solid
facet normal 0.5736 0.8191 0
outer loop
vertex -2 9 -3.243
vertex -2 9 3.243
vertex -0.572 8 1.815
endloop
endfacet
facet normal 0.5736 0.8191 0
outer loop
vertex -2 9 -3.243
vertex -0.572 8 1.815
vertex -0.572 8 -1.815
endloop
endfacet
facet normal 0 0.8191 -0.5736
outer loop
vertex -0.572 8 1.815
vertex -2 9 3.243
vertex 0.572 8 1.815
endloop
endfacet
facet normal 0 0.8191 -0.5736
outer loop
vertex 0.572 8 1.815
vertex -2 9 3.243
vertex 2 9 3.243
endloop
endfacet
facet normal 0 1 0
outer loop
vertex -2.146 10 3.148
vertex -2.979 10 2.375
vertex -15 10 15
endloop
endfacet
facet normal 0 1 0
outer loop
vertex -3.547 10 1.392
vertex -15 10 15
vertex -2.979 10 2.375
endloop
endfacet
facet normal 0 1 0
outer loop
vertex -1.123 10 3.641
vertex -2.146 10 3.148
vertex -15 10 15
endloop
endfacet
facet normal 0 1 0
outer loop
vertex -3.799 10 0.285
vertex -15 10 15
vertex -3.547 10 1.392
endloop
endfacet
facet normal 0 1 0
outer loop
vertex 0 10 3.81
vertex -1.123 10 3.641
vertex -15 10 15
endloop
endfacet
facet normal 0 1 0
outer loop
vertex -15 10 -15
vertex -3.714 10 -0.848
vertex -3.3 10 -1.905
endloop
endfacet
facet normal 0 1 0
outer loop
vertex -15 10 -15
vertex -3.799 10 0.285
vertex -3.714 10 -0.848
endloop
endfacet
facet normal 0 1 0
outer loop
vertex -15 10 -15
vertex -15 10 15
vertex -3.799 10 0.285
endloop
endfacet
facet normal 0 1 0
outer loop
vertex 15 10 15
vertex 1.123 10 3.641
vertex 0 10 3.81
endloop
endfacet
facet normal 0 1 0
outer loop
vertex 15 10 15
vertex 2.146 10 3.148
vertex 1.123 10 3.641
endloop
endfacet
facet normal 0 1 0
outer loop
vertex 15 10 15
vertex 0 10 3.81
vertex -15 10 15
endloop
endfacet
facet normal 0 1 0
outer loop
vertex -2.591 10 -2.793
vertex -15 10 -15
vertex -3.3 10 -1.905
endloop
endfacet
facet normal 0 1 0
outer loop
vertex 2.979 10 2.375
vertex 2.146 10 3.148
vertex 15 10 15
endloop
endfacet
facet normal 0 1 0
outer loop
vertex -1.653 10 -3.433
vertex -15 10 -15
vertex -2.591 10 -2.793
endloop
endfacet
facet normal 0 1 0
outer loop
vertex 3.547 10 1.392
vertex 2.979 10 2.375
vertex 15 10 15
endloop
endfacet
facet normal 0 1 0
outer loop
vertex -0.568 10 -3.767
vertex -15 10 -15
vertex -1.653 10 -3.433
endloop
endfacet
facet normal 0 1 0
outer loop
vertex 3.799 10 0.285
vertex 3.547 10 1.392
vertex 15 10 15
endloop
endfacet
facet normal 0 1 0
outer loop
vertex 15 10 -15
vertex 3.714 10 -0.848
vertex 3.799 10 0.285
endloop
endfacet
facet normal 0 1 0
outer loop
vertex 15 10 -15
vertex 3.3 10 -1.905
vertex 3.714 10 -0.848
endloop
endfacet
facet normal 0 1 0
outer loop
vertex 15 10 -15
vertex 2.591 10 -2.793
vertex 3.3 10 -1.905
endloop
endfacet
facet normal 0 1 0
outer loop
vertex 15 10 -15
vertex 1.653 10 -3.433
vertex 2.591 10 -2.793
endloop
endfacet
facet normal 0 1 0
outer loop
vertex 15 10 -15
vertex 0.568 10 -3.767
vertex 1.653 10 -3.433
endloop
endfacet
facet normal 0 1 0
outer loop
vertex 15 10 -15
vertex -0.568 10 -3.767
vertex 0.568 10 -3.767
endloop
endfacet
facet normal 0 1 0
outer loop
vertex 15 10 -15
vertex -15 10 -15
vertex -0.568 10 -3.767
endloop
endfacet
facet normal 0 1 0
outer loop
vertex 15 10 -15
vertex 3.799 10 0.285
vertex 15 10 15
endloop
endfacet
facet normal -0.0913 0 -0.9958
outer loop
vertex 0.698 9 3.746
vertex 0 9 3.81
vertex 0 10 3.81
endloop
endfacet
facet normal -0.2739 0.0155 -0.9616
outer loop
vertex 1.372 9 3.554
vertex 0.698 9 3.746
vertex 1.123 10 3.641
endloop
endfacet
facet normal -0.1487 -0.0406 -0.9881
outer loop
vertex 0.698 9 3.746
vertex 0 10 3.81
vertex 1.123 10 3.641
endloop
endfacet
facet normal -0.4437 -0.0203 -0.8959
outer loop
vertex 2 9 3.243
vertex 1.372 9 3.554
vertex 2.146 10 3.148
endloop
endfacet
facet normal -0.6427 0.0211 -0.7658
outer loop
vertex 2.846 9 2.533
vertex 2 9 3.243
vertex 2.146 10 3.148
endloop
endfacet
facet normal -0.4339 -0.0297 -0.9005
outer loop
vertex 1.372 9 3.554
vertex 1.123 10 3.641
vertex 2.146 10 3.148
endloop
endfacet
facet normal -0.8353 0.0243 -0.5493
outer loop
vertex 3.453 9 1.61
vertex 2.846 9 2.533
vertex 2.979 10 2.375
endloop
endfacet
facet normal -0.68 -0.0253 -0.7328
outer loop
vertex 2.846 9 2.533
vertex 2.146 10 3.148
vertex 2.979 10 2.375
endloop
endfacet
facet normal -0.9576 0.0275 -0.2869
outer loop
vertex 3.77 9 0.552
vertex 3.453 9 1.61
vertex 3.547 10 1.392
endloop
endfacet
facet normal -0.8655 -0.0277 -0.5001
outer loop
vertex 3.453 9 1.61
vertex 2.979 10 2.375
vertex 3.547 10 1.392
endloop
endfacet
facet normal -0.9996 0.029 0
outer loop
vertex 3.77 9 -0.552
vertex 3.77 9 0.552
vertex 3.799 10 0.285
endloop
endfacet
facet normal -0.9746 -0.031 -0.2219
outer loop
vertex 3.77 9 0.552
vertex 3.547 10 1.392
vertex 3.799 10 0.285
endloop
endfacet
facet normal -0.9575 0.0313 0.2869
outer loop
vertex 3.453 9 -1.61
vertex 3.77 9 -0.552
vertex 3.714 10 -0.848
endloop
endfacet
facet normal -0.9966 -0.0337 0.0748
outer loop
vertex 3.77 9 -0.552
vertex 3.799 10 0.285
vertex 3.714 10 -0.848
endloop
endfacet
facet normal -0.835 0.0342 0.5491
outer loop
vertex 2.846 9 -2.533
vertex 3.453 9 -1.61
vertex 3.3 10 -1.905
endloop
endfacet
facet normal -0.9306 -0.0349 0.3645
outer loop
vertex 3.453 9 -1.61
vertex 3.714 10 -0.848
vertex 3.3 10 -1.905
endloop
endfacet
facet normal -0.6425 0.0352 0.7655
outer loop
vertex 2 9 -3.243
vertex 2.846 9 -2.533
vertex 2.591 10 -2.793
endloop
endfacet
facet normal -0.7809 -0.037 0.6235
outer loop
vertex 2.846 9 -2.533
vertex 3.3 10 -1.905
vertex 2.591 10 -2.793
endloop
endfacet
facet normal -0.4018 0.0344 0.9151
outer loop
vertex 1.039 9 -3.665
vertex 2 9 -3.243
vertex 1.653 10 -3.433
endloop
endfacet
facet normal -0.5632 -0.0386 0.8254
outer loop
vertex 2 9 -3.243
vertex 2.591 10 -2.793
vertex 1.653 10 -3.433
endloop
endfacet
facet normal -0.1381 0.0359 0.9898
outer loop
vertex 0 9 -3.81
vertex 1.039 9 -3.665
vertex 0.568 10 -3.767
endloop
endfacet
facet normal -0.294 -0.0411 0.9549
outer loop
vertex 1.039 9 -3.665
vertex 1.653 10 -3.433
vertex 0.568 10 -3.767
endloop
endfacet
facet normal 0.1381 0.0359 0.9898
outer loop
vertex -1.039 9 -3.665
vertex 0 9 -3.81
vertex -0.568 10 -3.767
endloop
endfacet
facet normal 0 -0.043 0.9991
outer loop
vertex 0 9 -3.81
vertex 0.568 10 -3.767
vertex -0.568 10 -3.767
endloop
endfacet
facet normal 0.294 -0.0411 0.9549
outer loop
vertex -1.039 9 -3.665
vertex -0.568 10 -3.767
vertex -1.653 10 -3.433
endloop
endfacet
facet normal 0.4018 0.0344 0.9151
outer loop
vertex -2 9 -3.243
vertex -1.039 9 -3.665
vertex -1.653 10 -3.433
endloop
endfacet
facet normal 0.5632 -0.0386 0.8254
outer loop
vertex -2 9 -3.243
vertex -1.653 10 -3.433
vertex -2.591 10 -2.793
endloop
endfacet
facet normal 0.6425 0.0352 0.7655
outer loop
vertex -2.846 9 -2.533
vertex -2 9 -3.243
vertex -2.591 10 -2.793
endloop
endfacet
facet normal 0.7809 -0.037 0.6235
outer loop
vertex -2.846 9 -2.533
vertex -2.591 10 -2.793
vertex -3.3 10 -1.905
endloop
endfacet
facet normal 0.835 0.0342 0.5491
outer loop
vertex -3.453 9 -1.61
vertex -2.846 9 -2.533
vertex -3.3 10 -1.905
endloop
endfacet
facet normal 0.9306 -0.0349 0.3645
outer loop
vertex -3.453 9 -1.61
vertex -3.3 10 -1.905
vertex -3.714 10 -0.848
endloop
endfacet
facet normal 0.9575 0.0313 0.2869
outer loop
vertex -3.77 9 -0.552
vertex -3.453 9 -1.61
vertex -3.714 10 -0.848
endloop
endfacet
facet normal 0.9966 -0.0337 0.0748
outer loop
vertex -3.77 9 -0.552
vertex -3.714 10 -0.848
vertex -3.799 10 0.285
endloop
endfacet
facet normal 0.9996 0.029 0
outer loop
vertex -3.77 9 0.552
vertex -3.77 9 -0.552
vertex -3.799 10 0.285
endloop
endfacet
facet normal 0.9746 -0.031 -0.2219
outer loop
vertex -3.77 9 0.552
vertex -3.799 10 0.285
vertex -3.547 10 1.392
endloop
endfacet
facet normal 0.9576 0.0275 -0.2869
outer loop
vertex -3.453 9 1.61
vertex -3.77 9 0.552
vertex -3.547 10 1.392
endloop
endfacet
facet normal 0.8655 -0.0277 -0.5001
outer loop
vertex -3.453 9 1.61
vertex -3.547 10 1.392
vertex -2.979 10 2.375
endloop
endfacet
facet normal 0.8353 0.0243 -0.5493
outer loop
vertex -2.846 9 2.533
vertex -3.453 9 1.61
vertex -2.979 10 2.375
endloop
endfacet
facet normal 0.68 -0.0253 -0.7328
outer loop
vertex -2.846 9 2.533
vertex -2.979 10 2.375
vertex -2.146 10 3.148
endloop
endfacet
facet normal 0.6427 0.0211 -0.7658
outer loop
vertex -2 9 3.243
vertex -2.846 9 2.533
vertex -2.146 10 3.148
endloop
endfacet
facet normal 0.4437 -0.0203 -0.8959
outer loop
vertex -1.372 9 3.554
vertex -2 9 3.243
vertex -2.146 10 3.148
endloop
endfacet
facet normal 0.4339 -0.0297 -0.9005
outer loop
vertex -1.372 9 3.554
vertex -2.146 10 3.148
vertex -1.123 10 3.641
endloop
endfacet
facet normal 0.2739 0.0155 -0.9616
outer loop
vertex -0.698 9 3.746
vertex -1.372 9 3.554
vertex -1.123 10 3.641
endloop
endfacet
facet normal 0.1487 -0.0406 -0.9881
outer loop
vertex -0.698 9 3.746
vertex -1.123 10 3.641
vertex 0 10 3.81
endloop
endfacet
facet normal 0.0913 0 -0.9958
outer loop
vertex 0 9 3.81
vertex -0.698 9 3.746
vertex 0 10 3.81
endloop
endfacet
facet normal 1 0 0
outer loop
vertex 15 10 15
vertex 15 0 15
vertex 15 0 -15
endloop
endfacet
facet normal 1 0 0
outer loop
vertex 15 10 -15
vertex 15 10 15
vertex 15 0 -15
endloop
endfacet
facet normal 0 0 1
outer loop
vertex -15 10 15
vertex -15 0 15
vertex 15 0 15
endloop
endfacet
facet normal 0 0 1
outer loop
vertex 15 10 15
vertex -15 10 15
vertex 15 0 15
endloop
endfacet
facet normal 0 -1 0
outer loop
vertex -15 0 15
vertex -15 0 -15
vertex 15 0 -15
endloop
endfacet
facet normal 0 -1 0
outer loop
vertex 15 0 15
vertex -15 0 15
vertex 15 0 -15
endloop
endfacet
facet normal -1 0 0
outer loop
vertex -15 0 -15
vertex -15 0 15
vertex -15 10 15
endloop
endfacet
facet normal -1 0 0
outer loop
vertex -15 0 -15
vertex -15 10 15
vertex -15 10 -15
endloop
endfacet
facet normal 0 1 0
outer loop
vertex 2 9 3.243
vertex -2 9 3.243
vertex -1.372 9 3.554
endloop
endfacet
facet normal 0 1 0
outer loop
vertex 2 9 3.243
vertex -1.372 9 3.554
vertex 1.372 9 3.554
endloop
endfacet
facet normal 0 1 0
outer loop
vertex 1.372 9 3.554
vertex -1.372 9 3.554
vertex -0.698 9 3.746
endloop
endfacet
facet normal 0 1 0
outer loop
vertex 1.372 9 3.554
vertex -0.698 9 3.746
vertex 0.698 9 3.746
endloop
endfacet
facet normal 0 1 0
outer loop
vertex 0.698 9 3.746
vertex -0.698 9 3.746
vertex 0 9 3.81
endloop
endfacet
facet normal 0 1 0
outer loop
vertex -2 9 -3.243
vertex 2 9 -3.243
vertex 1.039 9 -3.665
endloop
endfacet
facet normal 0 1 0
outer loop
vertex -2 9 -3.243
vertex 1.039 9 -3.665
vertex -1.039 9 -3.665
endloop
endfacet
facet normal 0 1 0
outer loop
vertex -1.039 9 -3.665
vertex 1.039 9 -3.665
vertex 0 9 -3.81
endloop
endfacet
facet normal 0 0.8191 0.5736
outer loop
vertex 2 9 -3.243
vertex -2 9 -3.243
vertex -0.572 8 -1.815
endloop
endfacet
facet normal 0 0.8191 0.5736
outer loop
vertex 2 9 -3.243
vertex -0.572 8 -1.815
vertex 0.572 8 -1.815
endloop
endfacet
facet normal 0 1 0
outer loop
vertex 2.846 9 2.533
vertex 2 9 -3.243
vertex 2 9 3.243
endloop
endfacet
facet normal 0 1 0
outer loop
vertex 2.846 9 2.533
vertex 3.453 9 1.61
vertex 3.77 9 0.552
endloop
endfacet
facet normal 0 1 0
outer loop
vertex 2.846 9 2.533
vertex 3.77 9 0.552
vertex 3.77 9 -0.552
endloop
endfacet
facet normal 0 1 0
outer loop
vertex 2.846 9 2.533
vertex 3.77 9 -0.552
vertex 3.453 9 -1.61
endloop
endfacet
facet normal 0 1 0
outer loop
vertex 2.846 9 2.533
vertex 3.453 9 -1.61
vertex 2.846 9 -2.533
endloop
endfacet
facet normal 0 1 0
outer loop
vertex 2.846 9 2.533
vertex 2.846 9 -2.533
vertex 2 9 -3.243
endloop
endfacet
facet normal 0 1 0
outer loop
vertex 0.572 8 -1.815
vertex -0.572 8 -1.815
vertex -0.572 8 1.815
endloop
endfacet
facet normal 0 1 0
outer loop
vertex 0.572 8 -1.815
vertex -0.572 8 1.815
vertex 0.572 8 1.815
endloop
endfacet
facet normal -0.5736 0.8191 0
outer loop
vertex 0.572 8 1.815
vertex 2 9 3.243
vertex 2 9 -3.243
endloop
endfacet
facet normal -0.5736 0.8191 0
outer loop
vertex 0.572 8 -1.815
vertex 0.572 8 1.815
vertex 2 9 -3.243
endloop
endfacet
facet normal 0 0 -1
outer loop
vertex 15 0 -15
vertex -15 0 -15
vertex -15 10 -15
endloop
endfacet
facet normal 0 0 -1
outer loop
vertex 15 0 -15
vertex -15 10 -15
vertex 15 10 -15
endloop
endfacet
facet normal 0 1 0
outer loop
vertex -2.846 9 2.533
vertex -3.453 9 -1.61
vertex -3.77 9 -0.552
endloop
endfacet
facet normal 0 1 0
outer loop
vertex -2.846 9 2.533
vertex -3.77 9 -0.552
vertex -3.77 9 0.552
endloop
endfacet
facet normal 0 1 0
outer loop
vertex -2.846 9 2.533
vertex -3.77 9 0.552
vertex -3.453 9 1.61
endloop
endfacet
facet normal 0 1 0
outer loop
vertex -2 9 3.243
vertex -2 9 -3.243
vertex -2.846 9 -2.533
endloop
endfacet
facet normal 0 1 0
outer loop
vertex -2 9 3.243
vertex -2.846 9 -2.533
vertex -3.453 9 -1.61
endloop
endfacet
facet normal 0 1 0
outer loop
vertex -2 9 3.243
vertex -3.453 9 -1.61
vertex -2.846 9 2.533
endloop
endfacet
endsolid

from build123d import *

# Parameters (mm, degrees)
SKETCH1_W           = 30
SKETCH1_H           = 30
BOSS_EXTRUDE1_DEPTH = 10
SKETCH2_R           = 3.81
BORE_DEPTH          = 1
SKETCH3_W           = 4
SKETCH3_H           = 6.485707364
GROOVE_DEPTH        = 1
GROOVE_DRAFT        = -55


with BuildPart() as part:
    # Sketch1 → Boss-Extrude1 (new body)
    with BuildSketch(Plane(origin=(0, 0, 0), x_dir=(1, 0, 0), z_dir=(0, 1, 0))):
        Rectangle(SKETCH1_W, SKETCH1_H)
    extrude(amount=BOSS_EXTRUDE1_DEPTH)

    # Sketch2 → bore (cut)
    with BuildSketch(Plane(origin=(0, 10, 0), x_dir=(1, 0, 0), z_dir=(0, 1, 0))):
        with Locations(Location((0, 0, 0), (0, 0, 270))):
            Circle(SKETCH2_R)
    extrude(amount=-BORE_DEPTH, mode=Mode.SUBTRACT)


with BuildPart() as groove_tool:
    # Sketch3 → groove (with draft: the straight prism first)
    with BuildSketch(Plane(origin=(0, 9, 0), x_dir=(1, 0, 0), z_dir=(0, 1, 0))):
        Rectangle(SKETCH3_W, SKETCH3_H)
    extrude(amount=-GROOVE_DEPTH)
    # groove: the draft: its side faces are tilted about the plane it starts from
    groove_sides = [groove_tool.faces().sort_by_distance(p)[0] for p in [
        (-2, 8.5, 0),
        (0, 8.5, 3.242853682),
        (2, 8.5, 0),
        (0, 8.5, -3.242853682),
    ]]
    draft(groove_sides, Plane(origin=(0, 9, 0), x_dir=(1, 0, 0), z_dir=(0, 1, 0)), GROOVE_DRAFT)


with BuildPart() as part_1:
    add(part.part)

    # groove: cut by groove_tool
    add(groove_tool.part, mode=Mode.SUBTRACT)


solid = part_1.part
